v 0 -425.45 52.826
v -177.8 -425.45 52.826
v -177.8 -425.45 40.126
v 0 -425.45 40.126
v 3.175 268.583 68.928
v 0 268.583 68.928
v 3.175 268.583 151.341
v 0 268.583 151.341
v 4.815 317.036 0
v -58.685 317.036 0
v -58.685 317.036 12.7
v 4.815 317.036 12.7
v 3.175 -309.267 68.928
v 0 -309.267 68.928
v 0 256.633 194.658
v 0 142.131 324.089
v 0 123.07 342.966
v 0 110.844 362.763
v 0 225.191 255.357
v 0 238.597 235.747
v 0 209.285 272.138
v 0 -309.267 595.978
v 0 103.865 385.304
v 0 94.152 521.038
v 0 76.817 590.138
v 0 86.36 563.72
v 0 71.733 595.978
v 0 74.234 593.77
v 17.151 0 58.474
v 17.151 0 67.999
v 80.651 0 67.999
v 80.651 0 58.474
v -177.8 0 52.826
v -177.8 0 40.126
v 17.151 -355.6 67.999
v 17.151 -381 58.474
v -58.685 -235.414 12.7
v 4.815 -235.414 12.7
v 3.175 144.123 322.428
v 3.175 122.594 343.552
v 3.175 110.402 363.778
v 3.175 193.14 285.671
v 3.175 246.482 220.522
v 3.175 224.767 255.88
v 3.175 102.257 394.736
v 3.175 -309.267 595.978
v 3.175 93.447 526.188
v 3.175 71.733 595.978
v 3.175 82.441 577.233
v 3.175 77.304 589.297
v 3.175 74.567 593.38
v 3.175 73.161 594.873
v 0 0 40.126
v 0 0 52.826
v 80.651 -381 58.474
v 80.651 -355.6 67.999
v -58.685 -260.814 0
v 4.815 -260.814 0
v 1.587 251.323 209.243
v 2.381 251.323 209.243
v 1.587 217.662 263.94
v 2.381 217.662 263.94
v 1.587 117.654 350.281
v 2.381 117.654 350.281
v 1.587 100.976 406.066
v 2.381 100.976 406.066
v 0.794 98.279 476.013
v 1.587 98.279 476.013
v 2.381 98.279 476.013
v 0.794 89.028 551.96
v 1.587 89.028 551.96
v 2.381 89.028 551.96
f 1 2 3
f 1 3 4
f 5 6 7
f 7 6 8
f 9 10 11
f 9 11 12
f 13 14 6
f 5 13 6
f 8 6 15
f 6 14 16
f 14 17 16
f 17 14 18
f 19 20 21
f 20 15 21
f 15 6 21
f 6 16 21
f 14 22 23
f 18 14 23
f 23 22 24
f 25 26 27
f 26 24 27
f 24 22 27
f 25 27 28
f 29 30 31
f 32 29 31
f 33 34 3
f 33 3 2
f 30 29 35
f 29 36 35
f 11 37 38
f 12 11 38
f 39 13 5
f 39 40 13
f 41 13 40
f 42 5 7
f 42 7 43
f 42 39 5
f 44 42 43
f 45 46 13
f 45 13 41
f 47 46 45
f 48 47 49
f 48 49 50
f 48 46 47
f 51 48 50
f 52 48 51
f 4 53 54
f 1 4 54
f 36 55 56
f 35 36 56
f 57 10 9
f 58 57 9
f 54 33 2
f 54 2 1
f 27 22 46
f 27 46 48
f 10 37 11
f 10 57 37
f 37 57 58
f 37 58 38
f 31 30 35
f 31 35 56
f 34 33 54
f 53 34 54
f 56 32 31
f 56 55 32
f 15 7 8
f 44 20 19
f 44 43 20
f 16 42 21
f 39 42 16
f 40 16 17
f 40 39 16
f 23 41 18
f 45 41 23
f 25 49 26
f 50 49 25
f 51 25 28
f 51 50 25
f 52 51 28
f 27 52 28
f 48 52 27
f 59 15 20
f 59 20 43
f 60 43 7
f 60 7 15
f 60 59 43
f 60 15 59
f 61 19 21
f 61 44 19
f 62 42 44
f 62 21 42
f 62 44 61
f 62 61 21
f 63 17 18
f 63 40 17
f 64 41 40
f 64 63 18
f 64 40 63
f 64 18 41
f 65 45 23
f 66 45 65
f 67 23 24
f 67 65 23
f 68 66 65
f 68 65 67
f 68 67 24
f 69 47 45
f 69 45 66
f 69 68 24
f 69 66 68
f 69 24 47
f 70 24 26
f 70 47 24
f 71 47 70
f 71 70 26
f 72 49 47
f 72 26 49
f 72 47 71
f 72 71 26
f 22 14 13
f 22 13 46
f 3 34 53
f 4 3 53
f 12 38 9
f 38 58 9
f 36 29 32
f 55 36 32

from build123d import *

# Parameters (mm, degrees)
F0_W      = 63.5
F0_H      = 577.85
F1_DEPTH  = 12.7
F2_W      = 577.85
F2_H      = 527.05
F3_DEPTH  = 3.175
F5_DEPTH  = 25.4
F7_DEPTH  = 63.501
F8_DEPTH  = 61.8612912945
F9_DEPTH  = 61.8612912945
F10_W     = 177.8
F10_H     = 12.7
F11_DEPTH = 425.45
F14_W     = 63.5
F14_H     = 9.525
F15_DEPTH = 381
F17_DEPTH = 258.4515901963


with BuildPart() as f1:
    # F0 (on Top) → F1 (new body)
    with BuildSketch(Plane.XY):
        with Locations((-26.9352912945, 28.1112923563)):
            Rectangle(F0_W, F0_H)
    extrude(amount=F1_DEPTH)

    # F6 (on face) → F7 (cut, through all)
    with BuildSketch(Plane.YZ.offset(4.8147087055)):
        Polygon((-260.8137076437, 12.7), (-260.8137076437, 0), (-235.4137076437, 12.7), align=None)
    extrude(amount=-F7_DEPTH, mode=Mode.SUBTRACT)

    # F4 (on face) → F8 (cut, through all)
    with BuildSketch(Plane.YZ.offset(3.175)):
        with BuildLine():
            Line((268.5834025025, 151.3408869505), (268.5834025025, 213.3056139469))
            Line((268.5834025025, 213.3056139469), (268.5834025025, 595.9775148613))
            Line((268.5834025025, 595.9775148613), (71.7334025025, 595.9775148613))
            add(Edge.make_bspline(
                [(268.5834025025, 151.3408869505), (260.0579377157, 186.5340690938), (237.4179441691, 274.0807141118), (90.586356949, 338.2776875307), (106.1015892584, 468.8571672689), (84.7687089088, 587.7804257721), (71.7334025025, 595.9775148613)],
                knots=[0, 0, 0, 0, 0.2429134721, 0.5027830509, 0.7569279685, 1, 1, 1, 1], degree=3))
        make_face()
    extrude(amount=-F8_DEPTH, mode=Mode.SUBTRACT)

    # F4 (on face) → F9 (cut, through all)
    with BuildSketch(Plane.YZ.offset(3.175)):
        with BuildLine():
            Line((268.5834025025, 151.3408869505), (268.5834025025, 213.3056139469))
            Line((268.5834025025, 213.3056139469), (268.5834025025, 595.9775148613))
            Line((268.5834025025, 595.9775148613), (71.7334025025, 595.9775148613))
            add(Edge.make_bspline(
                [(268.5834025025, 151.3408869505), (260.0579377157, 186.5340690938), (237.4179441691, 274.0807141118), (90.586356949, 338.2776875307), (106.1015892584, 468.8571672689), (84.7687089088, 587.7804257721), (71.7334025025, 595.9775148613)],
                knots=[0, 0, 0, 0, 0.2429134721, 0.5027830509, 0.7569279685, 1, 1, 1, 1], degree=3))
        make_face()
    extrude(amount=-F9_DEPTH, mode=Mode.SUBTRACT)


with BuildPart() as f3:
    # F2 (on Right) → F3 (new body)
    with BuildSketch(Plane.YZ):
        with Locations((-20.3415974975, 332.4525148613)):
            Rectangle(F2_W, F2_H)
    extrude(amount=F3_DEPTH)

    # F4 (on face) → F5 (cut)
    with BuildSketch(Plane.YZ.offset(3.175)):
        with BuildLine():
            Line((268.5834025025, 151.3408869505), (268.5834025025, 213.3056139469))
            Line((268.5834025025, 213.3056139469), (268.5834025025, 595.9775148613))
            Line((268.5834025025, 595.9775148613), (71.7334025025, 595.9775148613))
            add(Edge.make_bspline(
                [(268.5834025025, 151.3408869505), (260.0579377157, 186.5340690938), (237.4179441691, 274.0807141118), (90.586356949, 338.2776875307), (106.1015892584, 468.8571672689), (84.7687089088, 587.7804257721), (71.7334025025, 595.9775148613)],
                knots=[0, 0, 0, 0, 0.2429134721, 0.5027830509, 0.7569279685, 1, 1, 1, 1], degree=3))
        make_face()
    extrude(amount=-F5_DEPTH, mode=Mode.SUBTRACT)


with BuildPart() as f11:
    # F10 (on Front) → F11 (new body)
    with BuildSketch(Plane.XZ):
        with Locations((-88.9, 46.4760677925)):
            Rectangle(F10_W, F10_H)
    extrude(amount=F11_DEPTH)


with BuildPart() as f12_1:
    # F12: copy of F1
    add(f1.part.moved(Location((127, 0, 0))))


with BuildPart() as f15:
    # F14 (on Front) → F15 (new body)
    with BuildSketch(Plane.XZ):
        with Locations((48.9005901963, 63.2363813341)):
            Rectangle(F14_W, F14_H)
    extrude(amount=F15_DEPTH)

    # F16 (on face) → F17 (cut, through all)
    with BuildSketch(Plane.YZ.offset(80.6505901963)):
        Polygon((-381, 67.9988813341), (-381, 58.4738813341), (-355.6, 67.9988813341), align=None)
    extrude(amount=-F17_DEPTH, mode=Mode.SUBTRACT)


solid = Compound([f1.part, f3.part, f11.part, f15.part])
